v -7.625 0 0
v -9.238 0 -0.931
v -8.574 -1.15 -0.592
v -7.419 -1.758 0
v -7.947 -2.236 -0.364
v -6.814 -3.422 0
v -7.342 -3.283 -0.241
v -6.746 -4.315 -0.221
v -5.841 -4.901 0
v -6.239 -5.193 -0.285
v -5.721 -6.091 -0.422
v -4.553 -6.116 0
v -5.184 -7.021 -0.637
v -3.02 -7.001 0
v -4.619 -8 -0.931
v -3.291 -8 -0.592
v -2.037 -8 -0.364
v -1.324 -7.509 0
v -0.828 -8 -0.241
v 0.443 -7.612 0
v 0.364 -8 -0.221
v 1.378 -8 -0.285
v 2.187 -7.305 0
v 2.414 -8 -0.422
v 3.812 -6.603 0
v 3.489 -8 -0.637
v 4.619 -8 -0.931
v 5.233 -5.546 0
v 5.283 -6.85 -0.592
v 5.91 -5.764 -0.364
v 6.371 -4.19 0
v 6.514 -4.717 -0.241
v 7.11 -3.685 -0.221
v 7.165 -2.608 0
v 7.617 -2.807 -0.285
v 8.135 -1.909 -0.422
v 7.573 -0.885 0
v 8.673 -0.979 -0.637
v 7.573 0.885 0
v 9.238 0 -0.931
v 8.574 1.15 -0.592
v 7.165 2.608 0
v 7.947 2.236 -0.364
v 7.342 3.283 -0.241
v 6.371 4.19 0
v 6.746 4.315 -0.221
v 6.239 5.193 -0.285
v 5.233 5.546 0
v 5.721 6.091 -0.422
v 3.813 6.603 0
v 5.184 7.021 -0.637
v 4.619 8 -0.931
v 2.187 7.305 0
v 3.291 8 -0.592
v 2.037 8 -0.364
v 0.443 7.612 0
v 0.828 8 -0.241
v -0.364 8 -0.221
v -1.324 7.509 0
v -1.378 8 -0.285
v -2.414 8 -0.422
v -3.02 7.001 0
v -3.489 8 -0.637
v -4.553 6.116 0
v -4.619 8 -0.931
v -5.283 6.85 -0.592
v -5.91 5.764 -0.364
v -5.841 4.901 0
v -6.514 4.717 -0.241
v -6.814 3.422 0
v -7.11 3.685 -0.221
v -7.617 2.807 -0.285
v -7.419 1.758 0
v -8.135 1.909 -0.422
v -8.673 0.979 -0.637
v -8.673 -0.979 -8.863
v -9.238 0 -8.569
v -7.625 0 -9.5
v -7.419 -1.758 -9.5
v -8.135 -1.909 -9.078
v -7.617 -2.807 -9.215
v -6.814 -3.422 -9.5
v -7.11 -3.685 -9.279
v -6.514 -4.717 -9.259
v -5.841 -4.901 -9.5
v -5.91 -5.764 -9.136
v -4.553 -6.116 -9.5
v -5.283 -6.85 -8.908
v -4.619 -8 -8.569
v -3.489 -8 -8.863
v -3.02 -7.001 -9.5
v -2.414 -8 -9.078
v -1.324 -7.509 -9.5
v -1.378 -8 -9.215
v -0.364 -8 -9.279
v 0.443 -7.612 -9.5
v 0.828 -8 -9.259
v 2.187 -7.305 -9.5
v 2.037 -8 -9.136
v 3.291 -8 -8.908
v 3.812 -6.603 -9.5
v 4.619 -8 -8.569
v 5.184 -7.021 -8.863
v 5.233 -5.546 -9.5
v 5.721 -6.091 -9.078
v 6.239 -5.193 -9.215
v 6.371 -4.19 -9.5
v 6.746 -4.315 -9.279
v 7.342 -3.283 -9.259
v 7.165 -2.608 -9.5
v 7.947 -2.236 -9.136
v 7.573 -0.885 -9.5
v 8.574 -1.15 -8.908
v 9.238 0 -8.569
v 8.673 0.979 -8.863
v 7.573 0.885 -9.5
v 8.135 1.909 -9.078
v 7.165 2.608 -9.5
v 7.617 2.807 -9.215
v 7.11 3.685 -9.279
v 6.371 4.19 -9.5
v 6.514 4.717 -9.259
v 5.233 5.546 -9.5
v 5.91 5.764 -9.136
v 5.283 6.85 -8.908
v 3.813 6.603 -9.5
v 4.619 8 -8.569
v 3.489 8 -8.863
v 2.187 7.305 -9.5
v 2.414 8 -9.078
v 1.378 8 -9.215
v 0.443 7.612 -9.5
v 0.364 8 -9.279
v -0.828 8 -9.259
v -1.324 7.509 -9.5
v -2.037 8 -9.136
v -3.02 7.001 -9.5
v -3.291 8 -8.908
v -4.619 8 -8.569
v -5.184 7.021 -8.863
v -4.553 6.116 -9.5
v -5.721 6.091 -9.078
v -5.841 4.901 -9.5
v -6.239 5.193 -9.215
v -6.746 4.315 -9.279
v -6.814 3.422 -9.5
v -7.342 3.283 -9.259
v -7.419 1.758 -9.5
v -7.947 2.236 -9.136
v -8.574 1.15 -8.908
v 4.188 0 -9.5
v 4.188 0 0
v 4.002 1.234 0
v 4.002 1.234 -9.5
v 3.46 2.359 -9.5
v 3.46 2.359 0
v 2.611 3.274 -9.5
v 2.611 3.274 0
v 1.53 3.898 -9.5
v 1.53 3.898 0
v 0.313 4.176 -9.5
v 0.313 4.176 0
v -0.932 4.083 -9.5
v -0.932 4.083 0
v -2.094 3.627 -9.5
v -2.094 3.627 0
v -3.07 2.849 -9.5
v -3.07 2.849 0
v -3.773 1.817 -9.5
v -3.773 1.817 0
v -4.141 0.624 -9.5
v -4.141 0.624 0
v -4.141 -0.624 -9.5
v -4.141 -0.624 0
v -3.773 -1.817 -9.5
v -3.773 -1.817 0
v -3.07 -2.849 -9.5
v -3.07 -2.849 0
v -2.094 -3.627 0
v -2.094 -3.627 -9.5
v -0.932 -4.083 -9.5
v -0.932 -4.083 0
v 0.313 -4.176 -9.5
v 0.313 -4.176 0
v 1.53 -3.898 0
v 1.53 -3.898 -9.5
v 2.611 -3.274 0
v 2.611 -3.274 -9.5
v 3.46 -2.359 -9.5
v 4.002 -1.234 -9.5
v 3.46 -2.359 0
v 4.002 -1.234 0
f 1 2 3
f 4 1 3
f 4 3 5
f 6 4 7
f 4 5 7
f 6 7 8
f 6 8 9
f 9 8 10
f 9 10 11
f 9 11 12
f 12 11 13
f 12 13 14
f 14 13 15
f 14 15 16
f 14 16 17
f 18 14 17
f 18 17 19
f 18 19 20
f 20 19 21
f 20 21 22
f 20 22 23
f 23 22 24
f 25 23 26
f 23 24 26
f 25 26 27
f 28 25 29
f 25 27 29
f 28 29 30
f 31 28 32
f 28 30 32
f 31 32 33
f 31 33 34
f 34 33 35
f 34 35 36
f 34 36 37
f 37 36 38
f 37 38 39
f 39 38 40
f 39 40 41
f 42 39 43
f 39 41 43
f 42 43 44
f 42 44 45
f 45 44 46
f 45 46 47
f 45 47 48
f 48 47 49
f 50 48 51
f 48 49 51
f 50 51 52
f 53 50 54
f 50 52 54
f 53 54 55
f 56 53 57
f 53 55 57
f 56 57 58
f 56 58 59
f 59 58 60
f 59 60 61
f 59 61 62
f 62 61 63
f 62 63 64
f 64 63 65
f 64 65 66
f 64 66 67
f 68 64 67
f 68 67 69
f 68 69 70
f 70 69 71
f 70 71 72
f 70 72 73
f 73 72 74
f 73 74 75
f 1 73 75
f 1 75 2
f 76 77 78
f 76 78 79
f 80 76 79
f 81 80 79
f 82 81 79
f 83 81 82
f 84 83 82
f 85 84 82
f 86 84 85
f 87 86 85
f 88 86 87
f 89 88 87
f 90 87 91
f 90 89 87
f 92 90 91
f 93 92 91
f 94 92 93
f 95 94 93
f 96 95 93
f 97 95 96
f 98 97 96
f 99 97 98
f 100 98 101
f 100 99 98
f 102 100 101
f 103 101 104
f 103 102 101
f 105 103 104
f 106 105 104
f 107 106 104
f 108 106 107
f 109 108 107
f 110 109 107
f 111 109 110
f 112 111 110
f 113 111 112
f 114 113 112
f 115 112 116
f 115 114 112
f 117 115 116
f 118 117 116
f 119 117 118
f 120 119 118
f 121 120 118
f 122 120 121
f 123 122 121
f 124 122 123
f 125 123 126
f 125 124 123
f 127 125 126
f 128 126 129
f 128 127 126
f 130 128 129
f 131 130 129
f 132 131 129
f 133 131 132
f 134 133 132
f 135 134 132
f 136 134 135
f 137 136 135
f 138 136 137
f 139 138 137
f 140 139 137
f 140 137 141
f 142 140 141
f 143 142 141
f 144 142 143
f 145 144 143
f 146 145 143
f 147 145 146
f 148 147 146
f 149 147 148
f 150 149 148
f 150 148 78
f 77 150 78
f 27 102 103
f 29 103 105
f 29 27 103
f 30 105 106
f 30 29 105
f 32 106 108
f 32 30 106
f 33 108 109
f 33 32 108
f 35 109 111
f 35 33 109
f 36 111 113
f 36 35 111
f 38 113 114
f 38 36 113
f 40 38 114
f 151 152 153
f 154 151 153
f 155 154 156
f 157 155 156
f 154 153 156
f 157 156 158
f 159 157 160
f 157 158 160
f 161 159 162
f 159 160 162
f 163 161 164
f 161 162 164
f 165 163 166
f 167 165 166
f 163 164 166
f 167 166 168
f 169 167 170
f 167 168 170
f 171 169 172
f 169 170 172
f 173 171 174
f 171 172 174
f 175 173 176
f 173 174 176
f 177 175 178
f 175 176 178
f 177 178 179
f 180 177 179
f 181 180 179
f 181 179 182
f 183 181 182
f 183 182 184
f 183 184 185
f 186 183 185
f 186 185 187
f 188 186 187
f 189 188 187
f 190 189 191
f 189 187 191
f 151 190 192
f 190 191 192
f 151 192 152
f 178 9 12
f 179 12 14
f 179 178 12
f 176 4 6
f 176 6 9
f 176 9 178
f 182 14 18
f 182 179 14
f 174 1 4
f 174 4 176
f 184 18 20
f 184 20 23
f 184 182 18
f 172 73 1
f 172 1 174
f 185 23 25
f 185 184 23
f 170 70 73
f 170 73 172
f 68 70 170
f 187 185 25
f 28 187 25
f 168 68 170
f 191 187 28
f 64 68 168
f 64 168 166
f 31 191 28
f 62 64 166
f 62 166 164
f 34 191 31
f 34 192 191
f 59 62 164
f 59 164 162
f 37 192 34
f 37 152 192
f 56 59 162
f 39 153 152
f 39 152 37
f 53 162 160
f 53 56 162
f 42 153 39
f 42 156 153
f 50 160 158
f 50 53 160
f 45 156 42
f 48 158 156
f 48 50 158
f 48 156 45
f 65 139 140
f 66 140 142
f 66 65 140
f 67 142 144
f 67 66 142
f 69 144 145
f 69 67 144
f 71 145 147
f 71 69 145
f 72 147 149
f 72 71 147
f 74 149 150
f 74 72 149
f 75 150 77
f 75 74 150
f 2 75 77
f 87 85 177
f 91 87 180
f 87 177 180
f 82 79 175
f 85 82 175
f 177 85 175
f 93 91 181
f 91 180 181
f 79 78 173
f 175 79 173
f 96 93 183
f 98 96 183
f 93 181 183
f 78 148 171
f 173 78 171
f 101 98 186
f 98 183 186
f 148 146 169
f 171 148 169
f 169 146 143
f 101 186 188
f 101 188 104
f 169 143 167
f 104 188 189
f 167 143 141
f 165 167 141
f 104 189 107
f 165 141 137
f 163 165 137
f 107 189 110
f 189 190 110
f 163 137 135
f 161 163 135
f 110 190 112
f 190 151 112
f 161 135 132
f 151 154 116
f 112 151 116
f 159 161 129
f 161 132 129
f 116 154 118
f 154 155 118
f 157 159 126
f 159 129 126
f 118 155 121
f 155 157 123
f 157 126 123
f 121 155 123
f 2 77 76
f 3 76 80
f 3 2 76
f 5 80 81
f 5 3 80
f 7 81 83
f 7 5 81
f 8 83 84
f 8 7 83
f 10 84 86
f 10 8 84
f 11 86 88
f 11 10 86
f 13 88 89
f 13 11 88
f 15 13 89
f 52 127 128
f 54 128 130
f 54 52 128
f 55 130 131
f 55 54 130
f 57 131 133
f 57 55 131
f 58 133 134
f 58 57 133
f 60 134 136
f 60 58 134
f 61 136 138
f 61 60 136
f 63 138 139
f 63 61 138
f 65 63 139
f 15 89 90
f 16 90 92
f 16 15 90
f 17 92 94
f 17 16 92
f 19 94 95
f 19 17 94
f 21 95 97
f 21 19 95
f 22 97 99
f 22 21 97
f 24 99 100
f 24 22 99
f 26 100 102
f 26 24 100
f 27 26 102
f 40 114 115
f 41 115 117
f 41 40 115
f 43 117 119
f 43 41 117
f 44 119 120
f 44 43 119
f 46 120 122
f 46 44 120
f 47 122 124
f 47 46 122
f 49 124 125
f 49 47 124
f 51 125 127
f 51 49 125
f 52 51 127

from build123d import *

# Parameters (mm, degrees)
SKETCH1_R     = 4.188
BASENUT_DEPTH = 9.5


with BuildPart() as part:
    # Sketch1 → BaseNut (new body)
    with BuildSketch(Plane.XY):
        Polygon((4.618802154, -8), (9.237604307, 0), (4.618802154, 8), (-4.618802154, 8), (-9.237604307, 0), (-4.618802154, -8), align=None)
        Circle(SKETCH1_R, mode=Mode.SUBTRACT)
    extrude(amount=-BASENUT_DEPTH)

    # Sketch2 → Double-Chamfer (revolve, cut)
    with BuildSketch(Plane(origin=(0, 0, 0), x_dir=(1, 0, 0), z_dir=(0, 1, 0))):
        Polygon((-9.237604307, 9.5), (-7.625, 9.5), (-9.237604307, 8.568962469), align=None)
        Polygon((-9.237604307, 0.931037531), (-9.237604307, 0), (-7.625, 0), align=None)
    revolve(axis=Axis((0, 0, -3.375940562), (0, 0, 1)), mode=Mode.SUBTRACT)


solid = part.part
